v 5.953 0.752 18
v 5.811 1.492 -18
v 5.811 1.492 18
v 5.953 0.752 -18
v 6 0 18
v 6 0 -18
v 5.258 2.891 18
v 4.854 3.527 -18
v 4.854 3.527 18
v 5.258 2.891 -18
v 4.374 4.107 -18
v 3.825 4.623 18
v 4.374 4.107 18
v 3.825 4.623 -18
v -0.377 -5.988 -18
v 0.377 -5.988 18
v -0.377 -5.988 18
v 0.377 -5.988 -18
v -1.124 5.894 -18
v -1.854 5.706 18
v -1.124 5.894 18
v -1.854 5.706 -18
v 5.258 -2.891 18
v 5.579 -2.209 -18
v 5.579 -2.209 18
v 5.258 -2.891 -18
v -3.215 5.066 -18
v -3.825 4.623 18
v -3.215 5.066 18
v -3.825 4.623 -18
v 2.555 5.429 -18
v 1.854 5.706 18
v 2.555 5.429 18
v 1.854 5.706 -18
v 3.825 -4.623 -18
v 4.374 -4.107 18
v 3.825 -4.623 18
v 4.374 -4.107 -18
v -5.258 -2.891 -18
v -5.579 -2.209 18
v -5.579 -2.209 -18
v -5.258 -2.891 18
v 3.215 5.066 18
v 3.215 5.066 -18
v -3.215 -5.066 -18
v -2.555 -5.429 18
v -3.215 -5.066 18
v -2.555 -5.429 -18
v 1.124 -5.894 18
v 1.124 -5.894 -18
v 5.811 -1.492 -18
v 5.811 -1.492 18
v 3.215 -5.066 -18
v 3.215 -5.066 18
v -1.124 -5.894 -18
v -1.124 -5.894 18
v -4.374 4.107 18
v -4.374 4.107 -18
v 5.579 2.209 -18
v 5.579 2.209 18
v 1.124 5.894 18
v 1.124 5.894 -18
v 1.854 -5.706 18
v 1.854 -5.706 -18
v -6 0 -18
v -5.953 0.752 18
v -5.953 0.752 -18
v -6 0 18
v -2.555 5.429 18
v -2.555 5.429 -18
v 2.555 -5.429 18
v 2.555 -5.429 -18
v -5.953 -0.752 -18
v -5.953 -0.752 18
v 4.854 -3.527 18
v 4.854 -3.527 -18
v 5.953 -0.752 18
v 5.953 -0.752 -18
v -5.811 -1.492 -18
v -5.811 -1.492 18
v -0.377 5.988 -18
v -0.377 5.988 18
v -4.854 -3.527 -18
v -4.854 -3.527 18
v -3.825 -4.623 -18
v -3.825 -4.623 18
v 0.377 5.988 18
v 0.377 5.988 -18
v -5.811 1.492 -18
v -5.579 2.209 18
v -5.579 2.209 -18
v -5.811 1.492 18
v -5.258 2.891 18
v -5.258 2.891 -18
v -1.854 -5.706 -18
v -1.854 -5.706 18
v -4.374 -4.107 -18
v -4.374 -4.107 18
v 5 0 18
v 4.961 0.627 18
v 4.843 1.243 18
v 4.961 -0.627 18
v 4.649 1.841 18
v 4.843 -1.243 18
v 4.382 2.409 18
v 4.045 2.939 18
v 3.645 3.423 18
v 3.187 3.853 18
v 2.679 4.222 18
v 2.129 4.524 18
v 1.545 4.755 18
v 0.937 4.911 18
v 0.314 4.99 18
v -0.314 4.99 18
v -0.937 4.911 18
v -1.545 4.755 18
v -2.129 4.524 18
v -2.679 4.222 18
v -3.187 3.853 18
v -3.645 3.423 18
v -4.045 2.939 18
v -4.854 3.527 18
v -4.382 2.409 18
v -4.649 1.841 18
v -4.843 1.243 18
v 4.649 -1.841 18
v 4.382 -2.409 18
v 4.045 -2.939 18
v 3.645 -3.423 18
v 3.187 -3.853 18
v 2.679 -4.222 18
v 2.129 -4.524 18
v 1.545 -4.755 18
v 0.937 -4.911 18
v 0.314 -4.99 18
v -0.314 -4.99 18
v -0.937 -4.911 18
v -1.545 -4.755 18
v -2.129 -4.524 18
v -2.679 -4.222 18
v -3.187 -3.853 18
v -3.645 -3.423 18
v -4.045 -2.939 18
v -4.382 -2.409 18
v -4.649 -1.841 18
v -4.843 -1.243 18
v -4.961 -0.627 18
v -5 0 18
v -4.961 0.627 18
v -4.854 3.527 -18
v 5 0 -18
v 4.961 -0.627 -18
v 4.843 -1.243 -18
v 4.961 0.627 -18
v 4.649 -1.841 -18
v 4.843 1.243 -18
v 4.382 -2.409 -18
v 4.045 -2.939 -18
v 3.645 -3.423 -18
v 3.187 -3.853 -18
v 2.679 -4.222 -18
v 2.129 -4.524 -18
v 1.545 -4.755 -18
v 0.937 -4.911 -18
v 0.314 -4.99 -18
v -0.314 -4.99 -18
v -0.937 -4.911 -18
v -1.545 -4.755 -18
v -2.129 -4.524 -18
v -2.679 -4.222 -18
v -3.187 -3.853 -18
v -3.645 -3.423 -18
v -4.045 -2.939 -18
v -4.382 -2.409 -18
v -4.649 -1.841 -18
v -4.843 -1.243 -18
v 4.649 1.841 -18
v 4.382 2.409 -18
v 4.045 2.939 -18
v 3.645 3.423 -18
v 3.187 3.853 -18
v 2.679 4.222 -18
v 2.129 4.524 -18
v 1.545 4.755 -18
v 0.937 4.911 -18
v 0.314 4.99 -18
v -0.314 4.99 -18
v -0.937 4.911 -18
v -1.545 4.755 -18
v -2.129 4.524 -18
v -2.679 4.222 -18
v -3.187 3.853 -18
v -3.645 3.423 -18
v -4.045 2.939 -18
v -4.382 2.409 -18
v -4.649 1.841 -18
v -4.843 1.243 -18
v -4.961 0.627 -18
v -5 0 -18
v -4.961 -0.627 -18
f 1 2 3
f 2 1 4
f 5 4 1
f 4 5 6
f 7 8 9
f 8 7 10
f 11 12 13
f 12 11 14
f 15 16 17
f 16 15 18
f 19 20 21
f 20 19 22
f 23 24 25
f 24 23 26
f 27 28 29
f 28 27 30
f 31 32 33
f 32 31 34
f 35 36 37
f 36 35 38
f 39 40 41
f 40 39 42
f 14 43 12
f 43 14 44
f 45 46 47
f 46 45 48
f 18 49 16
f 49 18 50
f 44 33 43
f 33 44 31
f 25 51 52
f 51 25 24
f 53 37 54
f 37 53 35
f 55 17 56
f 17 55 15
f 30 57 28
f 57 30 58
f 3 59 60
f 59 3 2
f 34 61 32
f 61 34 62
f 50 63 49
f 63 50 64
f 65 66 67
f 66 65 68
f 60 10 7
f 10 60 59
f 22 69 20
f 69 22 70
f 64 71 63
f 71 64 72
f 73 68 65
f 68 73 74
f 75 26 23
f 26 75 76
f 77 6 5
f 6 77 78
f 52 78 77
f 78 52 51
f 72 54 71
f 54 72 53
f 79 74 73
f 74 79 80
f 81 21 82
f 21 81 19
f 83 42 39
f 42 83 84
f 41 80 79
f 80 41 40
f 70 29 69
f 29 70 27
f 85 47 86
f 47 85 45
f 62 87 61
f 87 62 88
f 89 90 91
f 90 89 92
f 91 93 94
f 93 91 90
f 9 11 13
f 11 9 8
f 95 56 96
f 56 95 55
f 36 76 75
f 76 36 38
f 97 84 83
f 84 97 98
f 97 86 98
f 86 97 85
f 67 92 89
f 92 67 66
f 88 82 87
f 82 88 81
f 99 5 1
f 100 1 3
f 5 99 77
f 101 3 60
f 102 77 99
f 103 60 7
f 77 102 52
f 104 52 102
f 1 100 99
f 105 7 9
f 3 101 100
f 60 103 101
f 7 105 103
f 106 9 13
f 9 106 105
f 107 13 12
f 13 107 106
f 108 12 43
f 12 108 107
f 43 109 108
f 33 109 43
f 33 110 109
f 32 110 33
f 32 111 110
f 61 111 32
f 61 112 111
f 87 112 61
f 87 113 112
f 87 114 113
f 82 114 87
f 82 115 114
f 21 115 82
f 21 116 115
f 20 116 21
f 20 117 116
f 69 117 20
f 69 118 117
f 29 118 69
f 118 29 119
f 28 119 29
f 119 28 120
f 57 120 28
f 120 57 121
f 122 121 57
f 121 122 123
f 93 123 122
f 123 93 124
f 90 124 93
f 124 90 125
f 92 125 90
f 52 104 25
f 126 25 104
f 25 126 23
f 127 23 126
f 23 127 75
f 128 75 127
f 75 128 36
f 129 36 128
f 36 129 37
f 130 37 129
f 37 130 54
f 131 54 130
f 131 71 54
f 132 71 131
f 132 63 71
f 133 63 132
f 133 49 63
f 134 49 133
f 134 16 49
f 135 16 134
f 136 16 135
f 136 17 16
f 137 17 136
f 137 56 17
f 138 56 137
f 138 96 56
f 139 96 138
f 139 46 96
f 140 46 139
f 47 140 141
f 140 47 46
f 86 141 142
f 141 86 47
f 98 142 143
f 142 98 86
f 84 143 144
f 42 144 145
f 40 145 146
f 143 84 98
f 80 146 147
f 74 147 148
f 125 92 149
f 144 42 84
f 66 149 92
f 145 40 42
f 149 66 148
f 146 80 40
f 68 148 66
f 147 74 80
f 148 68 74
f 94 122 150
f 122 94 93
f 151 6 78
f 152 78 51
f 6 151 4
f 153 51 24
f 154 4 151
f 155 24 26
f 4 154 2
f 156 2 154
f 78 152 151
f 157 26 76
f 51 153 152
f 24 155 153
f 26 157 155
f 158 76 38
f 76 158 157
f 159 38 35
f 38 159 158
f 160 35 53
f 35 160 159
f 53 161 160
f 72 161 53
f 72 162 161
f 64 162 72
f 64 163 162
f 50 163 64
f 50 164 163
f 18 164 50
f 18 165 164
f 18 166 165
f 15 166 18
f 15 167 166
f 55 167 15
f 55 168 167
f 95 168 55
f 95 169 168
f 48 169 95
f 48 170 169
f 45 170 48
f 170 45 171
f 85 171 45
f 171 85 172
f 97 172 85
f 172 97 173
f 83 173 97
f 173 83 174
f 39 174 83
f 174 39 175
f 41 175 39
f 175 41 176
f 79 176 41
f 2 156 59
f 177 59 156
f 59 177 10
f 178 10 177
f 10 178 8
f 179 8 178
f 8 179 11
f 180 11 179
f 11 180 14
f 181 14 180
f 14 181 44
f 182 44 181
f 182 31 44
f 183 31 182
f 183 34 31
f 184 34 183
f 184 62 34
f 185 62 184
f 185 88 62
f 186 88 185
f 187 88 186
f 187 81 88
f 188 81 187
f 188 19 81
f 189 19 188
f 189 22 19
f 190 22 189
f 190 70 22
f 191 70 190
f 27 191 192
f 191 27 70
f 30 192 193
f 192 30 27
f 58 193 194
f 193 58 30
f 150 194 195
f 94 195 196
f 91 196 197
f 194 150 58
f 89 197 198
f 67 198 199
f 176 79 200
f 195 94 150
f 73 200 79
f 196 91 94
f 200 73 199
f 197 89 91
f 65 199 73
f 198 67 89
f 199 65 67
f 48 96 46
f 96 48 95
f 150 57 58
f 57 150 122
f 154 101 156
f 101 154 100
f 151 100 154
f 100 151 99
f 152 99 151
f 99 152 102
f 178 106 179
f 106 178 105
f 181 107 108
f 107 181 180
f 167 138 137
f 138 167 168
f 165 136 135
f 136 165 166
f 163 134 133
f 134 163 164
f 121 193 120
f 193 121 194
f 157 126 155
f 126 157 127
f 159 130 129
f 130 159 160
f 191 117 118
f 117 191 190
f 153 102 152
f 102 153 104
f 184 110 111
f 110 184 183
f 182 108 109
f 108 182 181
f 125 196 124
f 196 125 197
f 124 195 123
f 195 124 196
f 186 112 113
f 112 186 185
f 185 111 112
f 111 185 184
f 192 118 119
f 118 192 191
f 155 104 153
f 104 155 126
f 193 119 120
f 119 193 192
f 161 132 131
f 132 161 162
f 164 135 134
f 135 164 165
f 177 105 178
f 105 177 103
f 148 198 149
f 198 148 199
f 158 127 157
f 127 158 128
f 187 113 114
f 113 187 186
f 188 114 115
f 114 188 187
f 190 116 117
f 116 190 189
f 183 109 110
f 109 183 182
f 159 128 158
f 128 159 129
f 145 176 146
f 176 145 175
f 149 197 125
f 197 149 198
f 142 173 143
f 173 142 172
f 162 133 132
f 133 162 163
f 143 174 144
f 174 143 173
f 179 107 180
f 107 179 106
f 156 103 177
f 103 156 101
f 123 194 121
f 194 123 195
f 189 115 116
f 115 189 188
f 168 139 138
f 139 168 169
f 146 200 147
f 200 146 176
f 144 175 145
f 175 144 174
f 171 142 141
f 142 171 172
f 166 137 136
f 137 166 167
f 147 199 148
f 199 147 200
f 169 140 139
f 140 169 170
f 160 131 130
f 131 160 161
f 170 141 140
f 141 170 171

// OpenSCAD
$fn = 50;


difference() {
	union() {
		translate(v = [0, 0, -18.0000000000]) {
			cylinder(h = 36, r = 6.0000000000);
		}
	}
	union() {
		translate(v = [0, 0, -100.0000000000]) {
			cylinder(h = 200, r = 5.0000000000);
		}
	}
}
